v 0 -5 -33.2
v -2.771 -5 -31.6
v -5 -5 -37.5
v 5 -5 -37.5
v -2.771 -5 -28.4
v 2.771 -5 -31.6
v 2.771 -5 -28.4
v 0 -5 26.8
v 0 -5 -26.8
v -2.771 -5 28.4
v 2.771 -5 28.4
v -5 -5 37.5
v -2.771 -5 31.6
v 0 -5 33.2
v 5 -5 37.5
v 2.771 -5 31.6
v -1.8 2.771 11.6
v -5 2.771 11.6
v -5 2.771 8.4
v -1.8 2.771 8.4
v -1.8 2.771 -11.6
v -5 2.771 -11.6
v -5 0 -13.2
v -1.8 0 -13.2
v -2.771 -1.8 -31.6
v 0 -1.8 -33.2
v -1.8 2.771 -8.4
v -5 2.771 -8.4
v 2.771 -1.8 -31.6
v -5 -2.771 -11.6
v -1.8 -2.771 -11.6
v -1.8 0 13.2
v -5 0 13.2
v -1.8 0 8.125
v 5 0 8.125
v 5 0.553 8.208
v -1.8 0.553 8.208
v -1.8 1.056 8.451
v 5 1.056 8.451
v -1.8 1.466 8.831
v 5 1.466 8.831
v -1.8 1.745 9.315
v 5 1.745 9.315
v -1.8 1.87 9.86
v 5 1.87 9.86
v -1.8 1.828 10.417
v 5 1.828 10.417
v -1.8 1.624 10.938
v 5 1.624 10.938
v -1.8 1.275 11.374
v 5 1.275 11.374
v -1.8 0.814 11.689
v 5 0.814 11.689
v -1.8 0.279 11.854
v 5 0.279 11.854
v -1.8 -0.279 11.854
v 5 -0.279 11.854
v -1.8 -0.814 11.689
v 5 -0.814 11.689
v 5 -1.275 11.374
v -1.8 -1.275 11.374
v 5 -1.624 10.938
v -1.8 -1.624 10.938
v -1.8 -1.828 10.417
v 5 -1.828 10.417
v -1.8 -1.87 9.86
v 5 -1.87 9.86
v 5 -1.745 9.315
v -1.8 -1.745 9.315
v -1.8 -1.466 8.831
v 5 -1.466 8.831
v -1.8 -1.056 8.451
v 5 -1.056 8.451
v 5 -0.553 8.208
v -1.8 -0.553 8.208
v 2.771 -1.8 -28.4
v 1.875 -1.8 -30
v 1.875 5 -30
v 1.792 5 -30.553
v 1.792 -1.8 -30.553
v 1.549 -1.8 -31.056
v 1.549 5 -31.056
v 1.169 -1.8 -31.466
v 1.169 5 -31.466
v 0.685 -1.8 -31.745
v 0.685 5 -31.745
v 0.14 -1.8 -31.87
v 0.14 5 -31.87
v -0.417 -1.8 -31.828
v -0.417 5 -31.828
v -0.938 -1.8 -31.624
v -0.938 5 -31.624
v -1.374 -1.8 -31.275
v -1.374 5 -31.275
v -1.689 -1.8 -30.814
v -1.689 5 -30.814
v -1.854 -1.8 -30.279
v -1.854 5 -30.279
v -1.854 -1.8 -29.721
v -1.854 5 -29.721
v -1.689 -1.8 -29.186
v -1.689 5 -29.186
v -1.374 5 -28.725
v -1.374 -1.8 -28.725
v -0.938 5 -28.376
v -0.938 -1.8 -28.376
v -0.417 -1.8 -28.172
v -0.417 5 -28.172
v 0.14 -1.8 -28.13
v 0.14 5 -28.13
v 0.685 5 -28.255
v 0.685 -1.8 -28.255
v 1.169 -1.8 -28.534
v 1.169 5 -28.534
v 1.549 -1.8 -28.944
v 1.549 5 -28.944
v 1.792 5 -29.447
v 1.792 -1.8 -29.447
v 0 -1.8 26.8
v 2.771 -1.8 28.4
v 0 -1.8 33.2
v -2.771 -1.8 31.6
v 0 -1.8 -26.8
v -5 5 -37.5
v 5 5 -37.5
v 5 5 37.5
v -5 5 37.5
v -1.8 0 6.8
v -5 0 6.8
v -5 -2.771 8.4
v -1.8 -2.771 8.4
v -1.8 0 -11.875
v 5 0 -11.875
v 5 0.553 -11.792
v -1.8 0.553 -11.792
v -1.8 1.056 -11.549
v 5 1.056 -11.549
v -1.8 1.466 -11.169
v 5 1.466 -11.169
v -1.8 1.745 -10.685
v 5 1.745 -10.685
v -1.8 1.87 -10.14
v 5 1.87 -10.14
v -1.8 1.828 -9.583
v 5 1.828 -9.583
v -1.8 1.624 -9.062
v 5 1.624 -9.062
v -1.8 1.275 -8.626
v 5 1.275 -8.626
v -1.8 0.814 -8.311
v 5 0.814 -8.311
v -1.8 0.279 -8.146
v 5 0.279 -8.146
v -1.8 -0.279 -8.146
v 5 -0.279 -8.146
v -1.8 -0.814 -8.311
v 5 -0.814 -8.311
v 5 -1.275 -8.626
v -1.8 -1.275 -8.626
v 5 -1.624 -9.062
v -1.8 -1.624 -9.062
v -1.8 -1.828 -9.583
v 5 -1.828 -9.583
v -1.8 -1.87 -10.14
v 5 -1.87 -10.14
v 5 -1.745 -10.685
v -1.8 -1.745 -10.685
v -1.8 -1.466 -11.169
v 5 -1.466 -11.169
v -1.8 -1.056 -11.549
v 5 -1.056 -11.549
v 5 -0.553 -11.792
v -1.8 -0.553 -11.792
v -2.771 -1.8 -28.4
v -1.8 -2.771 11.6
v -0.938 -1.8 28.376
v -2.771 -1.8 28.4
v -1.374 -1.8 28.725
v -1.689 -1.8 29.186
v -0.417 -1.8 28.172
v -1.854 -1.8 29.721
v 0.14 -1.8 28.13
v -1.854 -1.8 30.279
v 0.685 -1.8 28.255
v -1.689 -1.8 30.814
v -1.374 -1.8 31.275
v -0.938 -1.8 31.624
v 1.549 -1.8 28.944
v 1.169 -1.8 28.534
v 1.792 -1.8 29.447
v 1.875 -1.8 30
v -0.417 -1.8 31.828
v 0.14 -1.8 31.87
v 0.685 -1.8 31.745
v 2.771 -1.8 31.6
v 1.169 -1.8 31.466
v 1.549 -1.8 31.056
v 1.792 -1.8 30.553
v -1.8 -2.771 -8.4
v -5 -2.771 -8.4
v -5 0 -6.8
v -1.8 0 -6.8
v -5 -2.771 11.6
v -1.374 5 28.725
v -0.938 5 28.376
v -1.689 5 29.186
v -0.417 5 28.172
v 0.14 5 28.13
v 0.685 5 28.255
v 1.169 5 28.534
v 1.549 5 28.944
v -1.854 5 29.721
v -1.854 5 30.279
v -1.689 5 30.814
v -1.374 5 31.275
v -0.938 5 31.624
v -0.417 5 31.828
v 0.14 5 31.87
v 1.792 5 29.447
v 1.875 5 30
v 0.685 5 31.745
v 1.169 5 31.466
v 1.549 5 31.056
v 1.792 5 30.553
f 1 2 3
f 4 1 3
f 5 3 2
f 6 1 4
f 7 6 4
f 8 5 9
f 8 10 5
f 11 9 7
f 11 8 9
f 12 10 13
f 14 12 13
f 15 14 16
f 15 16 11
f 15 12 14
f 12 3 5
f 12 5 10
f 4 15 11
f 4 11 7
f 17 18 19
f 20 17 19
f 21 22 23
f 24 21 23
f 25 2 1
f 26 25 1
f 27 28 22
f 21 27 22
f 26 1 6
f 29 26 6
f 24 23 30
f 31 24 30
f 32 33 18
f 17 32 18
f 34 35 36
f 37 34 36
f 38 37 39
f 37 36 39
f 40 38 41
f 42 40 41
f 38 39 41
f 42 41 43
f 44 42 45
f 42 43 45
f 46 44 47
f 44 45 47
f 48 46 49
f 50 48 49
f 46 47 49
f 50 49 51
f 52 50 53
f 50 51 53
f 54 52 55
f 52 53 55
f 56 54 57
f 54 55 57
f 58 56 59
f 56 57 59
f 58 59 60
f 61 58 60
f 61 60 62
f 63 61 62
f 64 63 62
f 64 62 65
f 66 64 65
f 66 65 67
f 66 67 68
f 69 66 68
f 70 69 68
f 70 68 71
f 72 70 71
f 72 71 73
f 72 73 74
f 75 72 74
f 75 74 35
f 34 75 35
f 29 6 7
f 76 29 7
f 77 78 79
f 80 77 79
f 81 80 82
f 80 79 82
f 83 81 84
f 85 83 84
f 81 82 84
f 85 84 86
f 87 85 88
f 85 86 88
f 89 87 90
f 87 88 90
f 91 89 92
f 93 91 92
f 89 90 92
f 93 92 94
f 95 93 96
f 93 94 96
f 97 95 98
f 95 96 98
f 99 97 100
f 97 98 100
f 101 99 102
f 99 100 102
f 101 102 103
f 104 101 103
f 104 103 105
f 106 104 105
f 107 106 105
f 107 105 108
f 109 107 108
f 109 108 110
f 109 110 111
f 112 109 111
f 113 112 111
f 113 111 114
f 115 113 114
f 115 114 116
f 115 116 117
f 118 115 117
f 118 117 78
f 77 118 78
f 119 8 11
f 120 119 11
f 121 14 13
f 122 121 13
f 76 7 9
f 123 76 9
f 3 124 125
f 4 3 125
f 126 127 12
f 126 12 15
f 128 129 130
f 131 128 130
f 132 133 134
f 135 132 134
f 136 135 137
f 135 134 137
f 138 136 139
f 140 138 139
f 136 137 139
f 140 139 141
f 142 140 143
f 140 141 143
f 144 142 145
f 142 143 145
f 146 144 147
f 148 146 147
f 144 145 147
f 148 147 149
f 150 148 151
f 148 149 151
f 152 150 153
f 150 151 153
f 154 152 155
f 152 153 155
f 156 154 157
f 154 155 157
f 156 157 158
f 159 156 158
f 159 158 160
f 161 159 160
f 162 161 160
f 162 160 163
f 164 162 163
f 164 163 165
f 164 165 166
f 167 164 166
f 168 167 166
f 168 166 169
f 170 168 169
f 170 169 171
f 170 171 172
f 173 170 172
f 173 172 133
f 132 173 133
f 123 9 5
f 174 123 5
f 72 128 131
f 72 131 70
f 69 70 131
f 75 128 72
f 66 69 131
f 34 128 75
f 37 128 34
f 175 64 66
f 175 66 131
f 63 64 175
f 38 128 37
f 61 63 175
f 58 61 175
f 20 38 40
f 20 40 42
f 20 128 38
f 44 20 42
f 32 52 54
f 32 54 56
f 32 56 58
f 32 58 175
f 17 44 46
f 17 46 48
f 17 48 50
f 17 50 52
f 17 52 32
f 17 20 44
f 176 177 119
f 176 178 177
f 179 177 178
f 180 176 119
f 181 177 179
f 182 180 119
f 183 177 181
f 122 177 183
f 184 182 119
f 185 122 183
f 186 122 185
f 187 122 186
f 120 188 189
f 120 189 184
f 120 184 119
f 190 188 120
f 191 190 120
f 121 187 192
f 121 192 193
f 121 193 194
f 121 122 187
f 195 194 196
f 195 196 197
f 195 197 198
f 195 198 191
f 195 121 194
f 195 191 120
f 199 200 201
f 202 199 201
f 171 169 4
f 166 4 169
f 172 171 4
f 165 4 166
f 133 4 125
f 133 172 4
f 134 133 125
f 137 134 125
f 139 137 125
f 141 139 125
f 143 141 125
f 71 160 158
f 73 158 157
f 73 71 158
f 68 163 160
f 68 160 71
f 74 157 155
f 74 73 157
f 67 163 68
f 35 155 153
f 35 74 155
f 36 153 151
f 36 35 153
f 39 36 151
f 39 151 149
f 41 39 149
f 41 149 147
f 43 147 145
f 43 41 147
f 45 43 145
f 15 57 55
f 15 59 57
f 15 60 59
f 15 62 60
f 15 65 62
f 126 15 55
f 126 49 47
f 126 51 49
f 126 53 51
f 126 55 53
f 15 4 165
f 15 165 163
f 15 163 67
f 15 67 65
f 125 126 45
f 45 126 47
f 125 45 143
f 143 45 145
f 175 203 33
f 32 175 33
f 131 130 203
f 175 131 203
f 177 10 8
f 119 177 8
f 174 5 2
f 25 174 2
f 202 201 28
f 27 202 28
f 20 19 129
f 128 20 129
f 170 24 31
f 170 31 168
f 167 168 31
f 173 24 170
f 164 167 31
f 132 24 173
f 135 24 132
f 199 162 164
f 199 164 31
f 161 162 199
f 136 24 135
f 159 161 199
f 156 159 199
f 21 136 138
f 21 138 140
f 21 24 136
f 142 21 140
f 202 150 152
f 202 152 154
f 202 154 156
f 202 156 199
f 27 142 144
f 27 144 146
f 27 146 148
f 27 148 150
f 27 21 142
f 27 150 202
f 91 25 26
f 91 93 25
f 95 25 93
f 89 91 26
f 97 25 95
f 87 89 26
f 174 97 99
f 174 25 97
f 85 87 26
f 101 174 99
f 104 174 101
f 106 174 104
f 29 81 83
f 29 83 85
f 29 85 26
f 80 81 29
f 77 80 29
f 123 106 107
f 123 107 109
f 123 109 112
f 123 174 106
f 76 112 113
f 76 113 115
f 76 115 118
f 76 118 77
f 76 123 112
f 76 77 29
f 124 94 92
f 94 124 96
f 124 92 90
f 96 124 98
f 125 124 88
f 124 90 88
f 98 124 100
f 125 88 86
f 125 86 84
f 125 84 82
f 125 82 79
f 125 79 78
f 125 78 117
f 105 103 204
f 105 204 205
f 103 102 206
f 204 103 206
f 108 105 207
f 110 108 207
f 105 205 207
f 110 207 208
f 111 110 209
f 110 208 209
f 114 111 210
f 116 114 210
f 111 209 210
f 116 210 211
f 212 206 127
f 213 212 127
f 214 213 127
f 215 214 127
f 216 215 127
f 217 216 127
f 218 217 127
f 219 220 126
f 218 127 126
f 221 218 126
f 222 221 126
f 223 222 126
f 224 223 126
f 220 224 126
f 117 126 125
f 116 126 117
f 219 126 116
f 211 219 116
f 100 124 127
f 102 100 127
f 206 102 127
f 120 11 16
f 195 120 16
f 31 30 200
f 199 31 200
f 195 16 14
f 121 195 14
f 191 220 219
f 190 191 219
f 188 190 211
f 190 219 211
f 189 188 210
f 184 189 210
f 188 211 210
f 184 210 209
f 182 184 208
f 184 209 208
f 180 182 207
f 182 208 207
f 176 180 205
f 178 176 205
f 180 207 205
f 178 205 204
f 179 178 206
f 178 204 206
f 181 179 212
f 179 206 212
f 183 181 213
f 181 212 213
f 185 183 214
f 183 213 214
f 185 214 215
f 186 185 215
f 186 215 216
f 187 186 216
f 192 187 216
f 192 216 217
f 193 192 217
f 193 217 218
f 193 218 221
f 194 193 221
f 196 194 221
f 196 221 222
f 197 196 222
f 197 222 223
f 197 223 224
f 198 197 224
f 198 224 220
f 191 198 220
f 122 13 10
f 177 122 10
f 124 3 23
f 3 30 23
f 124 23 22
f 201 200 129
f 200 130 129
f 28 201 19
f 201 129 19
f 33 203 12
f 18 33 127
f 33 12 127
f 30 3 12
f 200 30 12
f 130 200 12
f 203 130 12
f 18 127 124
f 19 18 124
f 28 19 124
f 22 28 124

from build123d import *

# Parameters (mm, degrees)
CROQUIS1_W                   = 10
CROQUIS1_H                   = 10
SALIENTE_EXTRUIR1_DEPTH      = 37.5
TALADRO_DE_MARGEN_PARA_M33_D = 3.75
TALADRO_DE_MARGEN_PARA_M34_D = 3.75
CORTAR_EXTRUIR4_DEPTH        = 3.2
CORTAR_EXTRUIR5_DEPTH        = 3.2


with BuildPart() as part:
    # Croquis1 → Saliente-Extruir1 (new body, symmetric)
    with BuildSketch(Plane.XY):
        Rectangle(CROQUIS1_W, CROQUIS1_H)
    extrude(amount=SALIENTE_EXTRUIR1_DEPTH, both=True)

    # Taladro de margen para M33 (through all)
    with Locations(Plane.ZY.offset(5)):
        with Locations((-10, 0), (10, 0)):
            Hole(TALADRO_DE_MARGEN_PARA_M33_D / 2)

    # Taladro de margen para M34 (through all)
    with Locations(Plane(origin=(0, -5, 0), x_dir=(-1, 0, 0), z_dir=(0, -1, 0))):
        with Locations((0, 30), (0, -30)):
            Hole(TALADRO_DE_MARGEN_PARA_M34_D / 2)

    # Croquis19 → Cortar-Extruir4 (cut)
    with BuildSketch(Plane.XZ.offset(5)):
        Polygon((2.771281292, -28.4), (0, -26.8), (-2.771281292, -28.4), (-2.771281292, -31.6), (0, -33.2), (2.771281292, -31.6), align=None)
        Polygon((2.771281292, 31.6), (0, 33.2), (-2.771281292, 31.6), (-2.771281292, 28.4), (0, 26.8), (2.771281292, 28.4), align=None)
    extrude(amount=-CORTAR_EXTRUIR4_DEPTH, mode=Mode.SUBTRACT)

    # Croquis20 → Cortar-Extruir5 (cut)
    with BuildSketch(Plane.ZY.offset(5)):
        Polygon((-8.4, -2.771281292), (-6.8, 0), (-8.4, 2.771281292), (-11.6, 2.771281292), (-13.2, 0), (-11.6, -2.771281292), align=None)
        Polygon((11.6, -2.771281292), (13.2, 0), (11.6, 2.771281292), (8.4, 2.771281292), (6.8, 0), (8.4, -2.771281292), align=None)
    extrude(amount=-CORTAR_EXTRUIR5_DEPTH, mode=Mode.SUBTRACT)


solid = part.part
